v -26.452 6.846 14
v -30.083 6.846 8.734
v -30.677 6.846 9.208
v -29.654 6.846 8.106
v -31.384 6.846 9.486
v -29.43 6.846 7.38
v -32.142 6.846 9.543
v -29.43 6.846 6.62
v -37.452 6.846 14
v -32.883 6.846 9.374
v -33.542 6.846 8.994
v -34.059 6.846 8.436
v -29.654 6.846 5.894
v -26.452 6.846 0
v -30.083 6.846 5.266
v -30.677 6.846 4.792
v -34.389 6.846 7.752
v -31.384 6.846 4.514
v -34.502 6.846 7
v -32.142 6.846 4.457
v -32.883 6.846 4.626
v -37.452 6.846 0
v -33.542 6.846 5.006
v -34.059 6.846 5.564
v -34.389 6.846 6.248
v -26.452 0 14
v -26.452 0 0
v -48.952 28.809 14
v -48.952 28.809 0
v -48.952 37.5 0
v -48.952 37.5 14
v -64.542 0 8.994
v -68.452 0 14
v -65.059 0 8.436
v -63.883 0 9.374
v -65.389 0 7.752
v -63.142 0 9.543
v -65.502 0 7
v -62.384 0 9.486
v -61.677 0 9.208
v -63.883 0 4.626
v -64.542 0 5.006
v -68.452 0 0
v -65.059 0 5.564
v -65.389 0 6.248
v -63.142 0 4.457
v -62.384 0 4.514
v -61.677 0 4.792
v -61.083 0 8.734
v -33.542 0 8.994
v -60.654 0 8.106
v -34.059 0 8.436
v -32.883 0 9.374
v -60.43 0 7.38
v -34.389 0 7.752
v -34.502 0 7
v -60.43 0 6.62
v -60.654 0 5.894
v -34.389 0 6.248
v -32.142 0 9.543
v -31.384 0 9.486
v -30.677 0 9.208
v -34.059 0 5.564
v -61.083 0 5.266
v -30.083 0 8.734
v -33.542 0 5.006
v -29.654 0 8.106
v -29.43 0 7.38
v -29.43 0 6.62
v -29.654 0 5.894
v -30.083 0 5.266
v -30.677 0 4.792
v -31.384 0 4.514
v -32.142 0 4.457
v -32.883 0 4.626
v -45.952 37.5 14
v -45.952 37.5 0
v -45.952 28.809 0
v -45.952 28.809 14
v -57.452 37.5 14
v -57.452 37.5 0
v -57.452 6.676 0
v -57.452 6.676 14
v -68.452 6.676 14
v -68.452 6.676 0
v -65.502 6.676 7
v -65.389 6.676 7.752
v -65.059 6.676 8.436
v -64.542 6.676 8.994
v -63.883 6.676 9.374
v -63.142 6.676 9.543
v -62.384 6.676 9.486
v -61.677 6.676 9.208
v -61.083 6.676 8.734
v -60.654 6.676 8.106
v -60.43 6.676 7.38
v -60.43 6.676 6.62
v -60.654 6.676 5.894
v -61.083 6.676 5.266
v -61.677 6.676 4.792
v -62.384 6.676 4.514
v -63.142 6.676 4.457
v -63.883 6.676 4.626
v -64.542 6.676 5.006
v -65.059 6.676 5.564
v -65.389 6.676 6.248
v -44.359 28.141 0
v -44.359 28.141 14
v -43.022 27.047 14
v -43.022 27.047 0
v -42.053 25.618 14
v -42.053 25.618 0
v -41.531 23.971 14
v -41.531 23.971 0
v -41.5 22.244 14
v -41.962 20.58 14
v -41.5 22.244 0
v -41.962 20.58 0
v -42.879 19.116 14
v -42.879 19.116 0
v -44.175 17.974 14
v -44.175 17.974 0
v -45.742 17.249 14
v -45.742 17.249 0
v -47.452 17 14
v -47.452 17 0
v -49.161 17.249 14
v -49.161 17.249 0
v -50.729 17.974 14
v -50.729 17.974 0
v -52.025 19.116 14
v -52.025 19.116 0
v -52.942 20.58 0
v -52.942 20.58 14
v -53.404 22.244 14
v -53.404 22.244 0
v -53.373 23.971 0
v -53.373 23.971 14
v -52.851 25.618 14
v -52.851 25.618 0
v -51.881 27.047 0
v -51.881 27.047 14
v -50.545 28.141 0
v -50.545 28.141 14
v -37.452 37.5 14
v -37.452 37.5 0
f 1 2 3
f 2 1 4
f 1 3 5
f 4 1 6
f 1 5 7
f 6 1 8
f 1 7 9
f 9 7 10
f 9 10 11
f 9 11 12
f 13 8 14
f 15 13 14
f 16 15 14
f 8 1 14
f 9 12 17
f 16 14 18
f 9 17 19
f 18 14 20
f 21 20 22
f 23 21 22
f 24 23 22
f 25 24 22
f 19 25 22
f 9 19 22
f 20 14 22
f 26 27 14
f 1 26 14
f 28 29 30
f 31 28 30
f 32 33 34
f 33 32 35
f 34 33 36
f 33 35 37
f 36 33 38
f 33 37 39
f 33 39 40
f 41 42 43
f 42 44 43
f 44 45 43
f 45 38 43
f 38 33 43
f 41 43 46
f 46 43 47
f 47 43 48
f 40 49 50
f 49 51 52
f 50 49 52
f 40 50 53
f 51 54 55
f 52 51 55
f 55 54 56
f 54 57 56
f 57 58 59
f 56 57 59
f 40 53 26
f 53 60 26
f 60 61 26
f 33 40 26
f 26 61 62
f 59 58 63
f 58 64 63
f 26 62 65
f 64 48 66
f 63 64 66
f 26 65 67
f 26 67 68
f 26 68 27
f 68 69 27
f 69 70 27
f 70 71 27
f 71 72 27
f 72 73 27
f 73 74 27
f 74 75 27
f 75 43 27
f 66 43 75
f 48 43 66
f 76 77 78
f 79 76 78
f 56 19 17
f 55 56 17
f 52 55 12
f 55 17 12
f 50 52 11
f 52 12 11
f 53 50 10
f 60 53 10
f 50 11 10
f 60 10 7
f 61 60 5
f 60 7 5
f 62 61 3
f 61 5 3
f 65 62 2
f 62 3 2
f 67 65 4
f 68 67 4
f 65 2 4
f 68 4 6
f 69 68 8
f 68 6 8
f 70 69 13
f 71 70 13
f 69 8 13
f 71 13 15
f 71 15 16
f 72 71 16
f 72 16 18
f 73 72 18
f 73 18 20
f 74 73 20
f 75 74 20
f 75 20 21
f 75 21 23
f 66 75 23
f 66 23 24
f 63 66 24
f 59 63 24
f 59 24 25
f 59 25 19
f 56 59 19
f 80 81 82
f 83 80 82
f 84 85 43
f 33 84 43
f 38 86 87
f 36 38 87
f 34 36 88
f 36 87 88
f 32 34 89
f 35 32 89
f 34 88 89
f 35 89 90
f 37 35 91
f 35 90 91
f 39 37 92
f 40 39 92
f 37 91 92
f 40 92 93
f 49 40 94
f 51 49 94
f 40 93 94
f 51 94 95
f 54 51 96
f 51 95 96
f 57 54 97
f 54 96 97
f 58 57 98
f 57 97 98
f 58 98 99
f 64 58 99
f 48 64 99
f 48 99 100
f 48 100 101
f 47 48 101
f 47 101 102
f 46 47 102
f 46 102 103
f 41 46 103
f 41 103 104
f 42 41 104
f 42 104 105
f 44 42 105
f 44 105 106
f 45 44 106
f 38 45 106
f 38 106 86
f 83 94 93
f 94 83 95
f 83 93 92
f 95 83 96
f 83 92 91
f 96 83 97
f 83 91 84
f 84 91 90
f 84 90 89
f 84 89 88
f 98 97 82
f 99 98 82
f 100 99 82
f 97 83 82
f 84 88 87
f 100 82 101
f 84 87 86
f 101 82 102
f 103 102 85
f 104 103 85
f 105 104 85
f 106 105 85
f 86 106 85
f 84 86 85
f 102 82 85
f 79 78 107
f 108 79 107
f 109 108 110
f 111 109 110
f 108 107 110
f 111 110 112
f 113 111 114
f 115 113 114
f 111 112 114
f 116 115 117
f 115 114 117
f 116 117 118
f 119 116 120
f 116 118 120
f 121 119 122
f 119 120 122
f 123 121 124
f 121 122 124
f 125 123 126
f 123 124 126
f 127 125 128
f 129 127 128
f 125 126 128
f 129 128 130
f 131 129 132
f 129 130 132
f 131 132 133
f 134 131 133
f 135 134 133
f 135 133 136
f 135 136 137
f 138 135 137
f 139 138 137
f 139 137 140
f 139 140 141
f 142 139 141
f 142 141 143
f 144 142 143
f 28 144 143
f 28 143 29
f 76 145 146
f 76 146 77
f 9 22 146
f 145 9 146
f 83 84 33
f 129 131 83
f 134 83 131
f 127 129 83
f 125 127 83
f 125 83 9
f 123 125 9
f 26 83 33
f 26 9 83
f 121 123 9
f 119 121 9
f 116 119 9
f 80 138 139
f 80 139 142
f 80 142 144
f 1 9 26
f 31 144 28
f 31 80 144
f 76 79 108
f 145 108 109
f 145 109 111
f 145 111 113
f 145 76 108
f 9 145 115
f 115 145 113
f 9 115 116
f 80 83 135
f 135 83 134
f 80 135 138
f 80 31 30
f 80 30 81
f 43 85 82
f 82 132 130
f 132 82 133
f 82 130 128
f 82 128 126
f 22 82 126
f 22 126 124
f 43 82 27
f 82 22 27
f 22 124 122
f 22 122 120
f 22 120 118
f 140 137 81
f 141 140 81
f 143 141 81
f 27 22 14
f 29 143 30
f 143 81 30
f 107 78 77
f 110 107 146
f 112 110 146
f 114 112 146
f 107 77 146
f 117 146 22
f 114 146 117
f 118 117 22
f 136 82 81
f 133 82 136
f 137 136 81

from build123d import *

# Parameters (mm, degrees)
F1_DEPTH = 14
F3_D     = 5.1


with BuildPart() as f1:
    # F0 (on Top) → F1 (new body)
    with BuildSketch(Plane.XY):
        with BuildLine():
            Line((-68.451825, 6.676397), (-68.451825, 0))
            Line((-68.451825, 0), (-26.451825, 0))
            Line((-26.451825, 0), (-26.451825, 6.846438))
            Line((-26.451825, 6.846438), (-37.451825, 6.846438))
            Line((-37.451825, 6.846438), (-37.451825, 37.5))
            Line((-37.451825, 37.5), (-45.951825, 37.5))
            Line((-45.951825, 37.5), (-45.951825, 28.809475))
            ThreePointArc((-45.951825, 28.809475), (-47.451825, 17), (-48.951825, 28.809475))
            Line((-48.951825, 28.809475), (-48.951825, 37.5))
            Line((-48.951825, 37.5), (-57.451825, 37.5))
            Line((-57.451825, 37.5), (-57.451825, 6.676397))
            Line((-57.451825, 6.676397), (-68.451825, 6.676397))
        make_face()
    extrude(amount=F1_DEPTH)

    # F3 (through all)
    with Locations(Plane.XZ):
        with Locations((-62.951825, 7), (-31.951825, 7)):
            Hole(F3_D / 2)


solid = f1.part
